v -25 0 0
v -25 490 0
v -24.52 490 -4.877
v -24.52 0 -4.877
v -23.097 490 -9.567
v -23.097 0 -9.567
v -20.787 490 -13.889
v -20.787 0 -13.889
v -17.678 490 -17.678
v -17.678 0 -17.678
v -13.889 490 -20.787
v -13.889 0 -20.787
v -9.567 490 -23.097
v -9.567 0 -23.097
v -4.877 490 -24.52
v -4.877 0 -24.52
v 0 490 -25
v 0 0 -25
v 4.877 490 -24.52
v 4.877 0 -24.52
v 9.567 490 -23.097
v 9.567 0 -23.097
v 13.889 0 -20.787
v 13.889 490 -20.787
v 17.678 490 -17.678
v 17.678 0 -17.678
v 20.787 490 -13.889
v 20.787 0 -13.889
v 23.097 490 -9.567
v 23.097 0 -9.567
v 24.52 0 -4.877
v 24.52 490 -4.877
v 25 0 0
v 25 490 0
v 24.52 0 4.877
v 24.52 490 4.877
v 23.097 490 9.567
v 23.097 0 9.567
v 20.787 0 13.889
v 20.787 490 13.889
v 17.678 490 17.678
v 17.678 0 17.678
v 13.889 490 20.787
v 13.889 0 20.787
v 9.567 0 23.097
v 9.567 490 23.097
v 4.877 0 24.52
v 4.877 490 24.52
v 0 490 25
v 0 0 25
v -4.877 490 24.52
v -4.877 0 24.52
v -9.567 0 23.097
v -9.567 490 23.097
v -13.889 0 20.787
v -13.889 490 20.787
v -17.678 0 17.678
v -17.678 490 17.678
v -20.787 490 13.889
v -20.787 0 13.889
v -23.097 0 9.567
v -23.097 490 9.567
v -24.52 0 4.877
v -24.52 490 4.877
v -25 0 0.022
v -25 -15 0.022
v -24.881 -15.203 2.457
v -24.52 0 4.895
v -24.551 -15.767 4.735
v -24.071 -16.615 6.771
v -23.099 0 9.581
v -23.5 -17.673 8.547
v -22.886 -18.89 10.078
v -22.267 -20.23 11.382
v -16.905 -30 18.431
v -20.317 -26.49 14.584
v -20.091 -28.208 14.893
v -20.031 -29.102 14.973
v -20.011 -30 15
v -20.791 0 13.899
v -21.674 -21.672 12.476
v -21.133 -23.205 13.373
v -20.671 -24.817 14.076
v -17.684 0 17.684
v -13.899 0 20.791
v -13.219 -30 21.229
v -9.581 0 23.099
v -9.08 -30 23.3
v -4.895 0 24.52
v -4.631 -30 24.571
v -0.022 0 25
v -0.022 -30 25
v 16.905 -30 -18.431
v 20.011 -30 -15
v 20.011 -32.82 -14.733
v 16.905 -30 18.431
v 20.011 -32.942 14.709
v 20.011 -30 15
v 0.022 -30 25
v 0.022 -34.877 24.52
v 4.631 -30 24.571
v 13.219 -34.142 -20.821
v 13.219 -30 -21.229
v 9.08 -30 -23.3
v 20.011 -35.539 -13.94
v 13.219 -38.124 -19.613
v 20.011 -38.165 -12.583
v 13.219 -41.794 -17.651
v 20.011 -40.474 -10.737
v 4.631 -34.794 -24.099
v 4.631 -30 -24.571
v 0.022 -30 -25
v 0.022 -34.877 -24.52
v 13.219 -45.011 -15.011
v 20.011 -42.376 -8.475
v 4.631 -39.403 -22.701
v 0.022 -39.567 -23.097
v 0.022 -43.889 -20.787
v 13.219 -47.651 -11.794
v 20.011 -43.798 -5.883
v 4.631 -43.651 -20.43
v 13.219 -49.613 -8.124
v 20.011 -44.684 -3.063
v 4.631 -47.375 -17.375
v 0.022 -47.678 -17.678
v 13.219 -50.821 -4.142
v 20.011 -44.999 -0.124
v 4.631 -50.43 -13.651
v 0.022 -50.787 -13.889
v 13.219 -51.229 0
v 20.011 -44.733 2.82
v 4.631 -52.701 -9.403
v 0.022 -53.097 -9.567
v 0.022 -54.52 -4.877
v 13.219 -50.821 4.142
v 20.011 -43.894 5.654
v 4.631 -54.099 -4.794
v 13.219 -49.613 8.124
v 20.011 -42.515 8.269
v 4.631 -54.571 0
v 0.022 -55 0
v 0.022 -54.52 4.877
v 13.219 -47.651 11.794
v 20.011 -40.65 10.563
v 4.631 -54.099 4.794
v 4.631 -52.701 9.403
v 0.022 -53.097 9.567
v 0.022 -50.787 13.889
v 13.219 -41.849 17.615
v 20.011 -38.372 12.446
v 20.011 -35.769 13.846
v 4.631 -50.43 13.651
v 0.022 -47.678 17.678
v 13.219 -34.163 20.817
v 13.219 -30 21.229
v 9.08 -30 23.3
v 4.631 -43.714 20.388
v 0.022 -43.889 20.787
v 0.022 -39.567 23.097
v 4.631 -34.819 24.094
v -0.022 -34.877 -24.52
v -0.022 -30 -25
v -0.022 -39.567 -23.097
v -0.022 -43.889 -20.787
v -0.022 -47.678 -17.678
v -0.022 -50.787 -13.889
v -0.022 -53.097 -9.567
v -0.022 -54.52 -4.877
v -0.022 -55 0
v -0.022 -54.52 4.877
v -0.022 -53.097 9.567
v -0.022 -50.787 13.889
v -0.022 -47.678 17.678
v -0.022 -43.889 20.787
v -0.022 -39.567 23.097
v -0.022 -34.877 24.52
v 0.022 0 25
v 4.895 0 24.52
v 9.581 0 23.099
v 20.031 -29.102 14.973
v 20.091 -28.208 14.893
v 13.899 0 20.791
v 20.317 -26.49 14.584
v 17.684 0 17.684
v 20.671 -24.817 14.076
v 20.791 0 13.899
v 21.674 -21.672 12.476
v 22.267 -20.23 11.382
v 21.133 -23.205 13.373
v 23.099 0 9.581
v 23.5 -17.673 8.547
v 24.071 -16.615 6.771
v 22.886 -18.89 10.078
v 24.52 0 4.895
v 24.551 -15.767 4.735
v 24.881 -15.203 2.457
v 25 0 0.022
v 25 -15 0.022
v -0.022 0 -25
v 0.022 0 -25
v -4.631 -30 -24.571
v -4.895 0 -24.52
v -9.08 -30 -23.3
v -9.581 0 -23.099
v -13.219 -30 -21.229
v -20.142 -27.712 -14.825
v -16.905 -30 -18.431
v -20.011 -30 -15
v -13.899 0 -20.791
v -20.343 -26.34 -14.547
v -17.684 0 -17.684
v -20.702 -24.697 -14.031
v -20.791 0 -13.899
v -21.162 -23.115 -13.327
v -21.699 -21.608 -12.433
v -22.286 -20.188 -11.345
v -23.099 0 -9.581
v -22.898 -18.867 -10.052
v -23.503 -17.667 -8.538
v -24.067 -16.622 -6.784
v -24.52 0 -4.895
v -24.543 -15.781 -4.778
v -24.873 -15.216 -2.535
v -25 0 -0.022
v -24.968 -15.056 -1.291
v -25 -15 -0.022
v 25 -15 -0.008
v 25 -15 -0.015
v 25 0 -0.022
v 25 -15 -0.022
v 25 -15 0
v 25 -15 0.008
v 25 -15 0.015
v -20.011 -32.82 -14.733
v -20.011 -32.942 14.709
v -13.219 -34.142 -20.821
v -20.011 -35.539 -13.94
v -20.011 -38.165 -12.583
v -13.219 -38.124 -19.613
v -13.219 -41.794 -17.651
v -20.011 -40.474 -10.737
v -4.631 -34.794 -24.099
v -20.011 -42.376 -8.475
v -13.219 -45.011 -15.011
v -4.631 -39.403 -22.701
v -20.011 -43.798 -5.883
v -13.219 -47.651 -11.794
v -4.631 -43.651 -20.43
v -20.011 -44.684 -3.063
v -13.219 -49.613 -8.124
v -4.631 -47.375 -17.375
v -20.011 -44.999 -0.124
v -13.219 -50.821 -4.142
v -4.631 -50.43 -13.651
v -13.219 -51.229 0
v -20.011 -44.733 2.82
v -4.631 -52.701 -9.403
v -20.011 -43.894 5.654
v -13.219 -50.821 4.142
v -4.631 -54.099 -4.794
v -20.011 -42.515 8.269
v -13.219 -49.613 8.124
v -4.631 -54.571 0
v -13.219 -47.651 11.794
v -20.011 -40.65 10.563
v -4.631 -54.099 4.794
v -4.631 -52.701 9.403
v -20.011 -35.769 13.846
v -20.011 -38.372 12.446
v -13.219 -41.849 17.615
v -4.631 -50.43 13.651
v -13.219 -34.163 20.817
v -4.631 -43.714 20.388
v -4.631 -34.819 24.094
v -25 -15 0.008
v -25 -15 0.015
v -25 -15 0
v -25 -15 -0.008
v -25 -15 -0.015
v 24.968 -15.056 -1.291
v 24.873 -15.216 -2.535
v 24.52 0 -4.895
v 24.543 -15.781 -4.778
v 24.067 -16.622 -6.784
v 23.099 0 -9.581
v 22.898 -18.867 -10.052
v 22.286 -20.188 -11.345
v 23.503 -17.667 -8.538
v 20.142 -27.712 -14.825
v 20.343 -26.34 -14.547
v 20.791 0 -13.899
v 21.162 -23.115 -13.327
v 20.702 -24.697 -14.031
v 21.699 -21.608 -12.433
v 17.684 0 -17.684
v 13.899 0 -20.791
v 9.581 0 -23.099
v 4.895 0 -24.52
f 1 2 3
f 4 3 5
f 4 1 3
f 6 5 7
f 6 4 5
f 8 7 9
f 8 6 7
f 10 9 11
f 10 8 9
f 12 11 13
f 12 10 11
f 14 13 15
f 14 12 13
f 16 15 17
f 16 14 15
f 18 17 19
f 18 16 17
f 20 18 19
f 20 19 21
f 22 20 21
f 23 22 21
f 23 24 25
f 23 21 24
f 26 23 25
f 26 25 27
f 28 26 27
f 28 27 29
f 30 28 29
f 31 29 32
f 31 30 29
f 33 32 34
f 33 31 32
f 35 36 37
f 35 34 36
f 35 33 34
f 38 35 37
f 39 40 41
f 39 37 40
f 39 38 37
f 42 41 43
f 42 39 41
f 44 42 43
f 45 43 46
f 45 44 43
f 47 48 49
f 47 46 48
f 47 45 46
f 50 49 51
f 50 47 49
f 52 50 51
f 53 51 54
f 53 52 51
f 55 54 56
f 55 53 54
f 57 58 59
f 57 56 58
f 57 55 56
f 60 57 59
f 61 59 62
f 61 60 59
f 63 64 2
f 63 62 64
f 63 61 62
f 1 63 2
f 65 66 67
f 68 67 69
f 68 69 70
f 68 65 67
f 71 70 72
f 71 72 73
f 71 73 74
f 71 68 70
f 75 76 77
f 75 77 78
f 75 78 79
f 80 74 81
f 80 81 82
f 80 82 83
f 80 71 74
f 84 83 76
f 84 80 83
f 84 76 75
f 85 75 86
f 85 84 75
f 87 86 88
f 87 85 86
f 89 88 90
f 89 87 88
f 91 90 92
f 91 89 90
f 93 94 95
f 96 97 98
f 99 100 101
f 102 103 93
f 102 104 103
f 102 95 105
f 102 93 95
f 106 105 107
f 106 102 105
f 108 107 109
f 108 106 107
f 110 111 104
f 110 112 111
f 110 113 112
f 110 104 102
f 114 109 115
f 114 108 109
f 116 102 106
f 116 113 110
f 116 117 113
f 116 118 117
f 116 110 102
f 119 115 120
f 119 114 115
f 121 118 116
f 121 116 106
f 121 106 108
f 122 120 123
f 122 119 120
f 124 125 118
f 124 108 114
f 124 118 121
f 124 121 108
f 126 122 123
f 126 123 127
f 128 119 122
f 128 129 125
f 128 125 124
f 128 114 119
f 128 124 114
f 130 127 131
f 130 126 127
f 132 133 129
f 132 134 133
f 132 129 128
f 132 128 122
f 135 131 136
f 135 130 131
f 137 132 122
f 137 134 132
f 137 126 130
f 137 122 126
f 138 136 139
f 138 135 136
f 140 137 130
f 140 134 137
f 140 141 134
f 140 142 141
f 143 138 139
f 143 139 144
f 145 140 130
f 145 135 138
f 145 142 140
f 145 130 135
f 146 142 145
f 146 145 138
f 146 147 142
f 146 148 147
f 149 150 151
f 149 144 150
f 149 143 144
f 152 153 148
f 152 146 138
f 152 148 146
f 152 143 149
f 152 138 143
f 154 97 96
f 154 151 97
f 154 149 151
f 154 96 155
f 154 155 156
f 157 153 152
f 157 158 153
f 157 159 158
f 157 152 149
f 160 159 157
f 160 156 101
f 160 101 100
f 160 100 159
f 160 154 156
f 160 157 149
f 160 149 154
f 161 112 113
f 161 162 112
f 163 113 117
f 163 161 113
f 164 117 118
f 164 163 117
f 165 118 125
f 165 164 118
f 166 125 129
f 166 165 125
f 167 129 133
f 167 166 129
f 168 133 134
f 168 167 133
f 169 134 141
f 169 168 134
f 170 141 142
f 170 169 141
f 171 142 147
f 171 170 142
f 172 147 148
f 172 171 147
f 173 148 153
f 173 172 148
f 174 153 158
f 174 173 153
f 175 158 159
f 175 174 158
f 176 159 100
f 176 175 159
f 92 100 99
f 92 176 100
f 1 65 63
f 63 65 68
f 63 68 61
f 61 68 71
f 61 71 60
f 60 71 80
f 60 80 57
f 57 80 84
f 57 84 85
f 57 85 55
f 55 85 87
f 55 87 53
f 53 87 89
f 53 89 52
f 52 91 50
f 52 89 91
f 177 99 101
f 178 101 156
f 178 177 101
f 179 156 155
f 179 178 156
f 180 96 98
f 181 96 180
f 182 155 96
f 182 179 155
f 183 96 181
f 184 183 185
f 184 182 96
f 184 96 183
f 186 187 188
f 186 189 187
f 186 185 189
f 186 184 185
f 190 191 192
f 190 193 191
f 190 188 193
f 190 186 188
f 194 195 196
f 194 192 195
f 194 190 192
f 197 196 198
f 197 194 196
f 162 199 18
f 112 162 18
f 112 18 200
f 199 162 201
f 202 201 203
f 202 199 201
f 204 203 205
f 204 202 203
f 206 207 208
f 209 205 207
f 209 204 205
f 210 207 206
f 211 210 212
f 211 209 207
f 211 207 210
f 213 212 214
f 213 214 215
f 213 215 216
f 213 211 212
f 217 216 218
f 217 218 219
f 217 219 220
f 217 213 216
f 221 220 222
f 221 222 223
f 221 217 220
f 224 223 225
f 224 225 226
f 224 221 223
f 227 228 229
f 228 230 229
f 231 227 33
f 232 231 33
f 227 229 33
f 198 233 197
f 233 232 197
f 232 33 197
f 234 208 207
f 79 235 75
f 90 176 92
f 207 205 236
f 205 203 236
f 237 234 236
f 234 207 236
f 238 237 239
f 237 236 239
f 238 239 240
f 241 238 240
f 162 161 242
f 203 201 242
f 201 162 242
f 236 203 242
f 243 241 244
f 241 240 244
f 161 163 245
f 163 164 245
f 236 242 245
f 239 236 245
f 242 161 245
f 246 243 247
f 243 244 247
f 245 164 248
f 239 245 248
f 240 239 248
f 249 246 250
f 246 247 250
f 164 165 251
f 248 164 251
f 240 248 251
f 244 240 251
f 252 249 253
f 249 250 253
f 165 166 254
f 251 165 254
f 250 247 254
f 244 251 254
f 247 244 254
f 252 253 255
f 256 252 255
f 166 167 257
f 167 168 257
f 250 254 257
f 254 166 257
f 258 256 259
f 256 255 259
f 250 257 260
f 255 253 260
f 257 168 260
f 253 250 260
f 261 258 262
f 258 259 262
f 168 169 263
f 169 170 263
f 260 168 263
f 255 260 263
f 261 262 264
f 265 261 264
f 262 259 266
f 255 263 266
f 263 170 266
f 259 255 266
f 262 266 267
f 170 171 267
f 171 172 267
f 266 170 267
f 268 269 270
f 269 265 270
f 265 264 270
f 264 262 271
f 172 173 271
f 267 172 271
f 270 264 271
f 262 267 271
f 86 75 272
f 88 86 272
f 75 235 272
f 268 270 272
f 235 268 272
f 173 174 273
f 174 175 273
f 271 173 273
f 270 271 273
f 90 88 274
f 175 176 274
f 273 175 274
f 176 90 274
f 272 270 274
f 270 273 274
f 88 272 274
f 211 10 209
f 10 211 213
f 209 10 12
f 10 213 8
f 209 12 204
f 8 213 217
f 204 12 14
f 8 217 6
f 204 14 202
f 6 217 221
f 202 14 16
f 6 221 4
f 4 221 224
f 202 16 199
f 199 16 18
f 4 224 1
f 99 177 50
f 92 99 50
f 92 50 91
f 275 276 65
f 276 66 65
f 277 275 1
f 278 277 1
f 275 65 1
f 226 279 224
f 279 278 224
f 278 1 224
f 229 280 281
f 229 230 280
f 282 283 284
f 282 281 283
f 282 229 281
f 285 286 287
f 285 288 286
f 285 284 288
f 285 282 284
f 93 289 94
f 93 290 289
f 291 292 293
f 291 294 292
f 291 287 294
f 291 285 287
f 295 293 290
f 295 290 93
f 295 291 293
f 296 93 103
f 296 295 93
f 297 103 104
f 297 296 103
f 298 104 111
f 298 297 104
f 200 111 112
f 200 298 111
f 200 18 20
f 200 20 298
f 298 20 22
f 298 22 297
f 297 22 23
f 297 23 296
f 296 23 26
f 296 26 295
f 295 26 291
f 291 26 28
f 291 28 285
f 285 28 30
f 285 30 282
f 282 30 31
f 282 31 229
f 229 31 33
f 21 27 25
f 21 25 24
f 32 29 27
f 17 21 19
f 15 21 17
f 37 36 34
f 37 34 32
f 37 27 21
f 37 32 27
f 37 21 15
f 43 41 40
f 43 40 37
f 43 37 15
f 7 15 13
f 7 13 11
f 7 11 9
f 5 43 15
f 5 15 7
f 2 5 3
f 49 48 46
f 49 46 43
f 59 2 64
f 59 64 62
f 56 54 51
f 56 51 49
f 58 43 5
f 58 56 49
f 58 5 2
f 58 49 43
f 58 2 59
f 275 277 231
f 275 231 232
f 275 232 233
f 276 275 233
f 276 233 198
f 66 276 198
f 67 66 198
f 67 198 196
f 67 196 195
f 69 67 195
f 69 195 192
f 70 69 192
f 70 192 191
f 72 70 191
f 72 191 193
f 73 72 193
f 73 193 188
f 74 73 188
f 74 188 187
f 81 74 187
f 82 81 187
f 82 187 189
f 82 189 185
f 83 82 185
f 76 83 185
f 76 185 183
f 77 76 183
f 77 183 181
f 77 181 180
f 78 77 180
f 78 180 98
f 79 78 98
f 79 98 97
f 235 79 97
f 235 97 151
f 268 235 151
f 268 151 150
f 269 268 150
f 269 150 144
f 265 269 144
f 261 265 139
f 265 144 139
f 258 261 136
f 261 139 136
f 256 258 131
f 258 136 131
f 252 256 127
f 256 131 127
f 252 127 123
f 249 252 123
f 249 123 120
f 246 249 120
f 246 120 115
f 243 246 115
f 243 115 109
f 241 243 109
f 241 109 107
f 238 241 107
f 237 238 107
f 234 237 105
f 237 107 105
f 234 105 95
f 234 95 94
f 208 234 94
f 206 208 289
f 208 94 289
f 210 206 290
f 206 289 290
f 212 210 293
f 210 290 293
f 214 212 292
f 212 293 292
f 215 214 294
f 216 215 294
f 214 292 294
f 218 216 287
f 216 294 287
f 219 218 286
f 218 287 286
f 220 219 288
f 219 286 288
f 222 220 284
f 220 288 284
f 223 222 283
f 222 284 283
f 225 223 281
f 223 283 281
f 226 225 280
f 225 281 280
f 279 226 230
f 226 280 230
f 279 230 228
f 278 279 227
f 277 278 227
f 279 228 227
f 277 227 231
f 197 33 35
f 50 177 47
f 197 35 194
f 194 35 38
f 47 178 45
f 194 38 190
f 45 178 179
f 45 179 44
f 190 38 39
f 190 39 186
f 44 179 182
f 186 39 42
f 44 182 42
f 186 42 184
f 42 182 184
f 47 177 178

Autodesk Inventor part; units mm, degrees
ref_plane "XZ Plane" through (0, 0, 0) normal (0, 1, 0) x (-1, 0, 0)
ref_plane "XY Plane" through (0, 0, 0) normal (0, 0, 1) x (1, 0, 0)
sketch "Sketch1" plane through (0, 0, 0) normal (0, 1, 0) x (-1, 0, 0)
  circle A0 centre (0, 0) radius 25
  dimension "d0" = 50
extrude "Extrusion1" add sketch "Sketch1" along normal blind 490
sketch "Sketch2" plane through (0, 0, 0) normal (0, -1, 0) x (1, 0, 0)
  line L0 (-25, -25) -> (25, -25)
  line L1 (25, -25) -> (25, 25)
  line L2 (25, 25) -> (-25, 25)
  line L3 (-25, 25) -> (-25, -25)
  point P0 (0, 0)
extrude "Extrusion2" add sketch "Sketch2" along normal blind 60
sketch "Sketch3" plane through (0, 0, 0) normal (1, 0, 0) x (0, 1, 0)
  circle A0 centre (-30, 0) radius 15
  line L0 (0, -25) -> (0, 0) projected
  line L1 (0, 25) -> (-60, 25) projected
  line L2 (0, -25) -> (-60, -25) projected
  arc A1 (-30, 25) -> (-30, -25) centre (-30, 0) ccw
  line L3 (-30, 25) -> (-30, 40.1158)
  line L4 (-30, 40.1158) -> (-76.6193, 40.1158)
  line L5 (-76.6193, 40.1158) -> (-77.4473, -45.6375)
  line L6 (-77.4473, -45.6375) -> (-35.1048, -45.6375)
  line L7 (-35.1048, -45.6375) -> (-30, -25)
  dimension "d5" = 30
  dimension "d6" = 30
extrude "Extrusion3" cut sketch "Sketch3" along normal mid plane 100
fillet "Fillet1" radius 24.9775 6 edges at (25, -55, 0) (25, -15, -25) (25, -15, 25) (-25, -55, 0) (-25, -15, -25) (-25, -15, 25)
sketch "Sketch4" plane through (0, 0, 0) normal (1, 0, 0) x (0, 1, 0)
  line L0 (16.2777, 47.2828) -> (16.2777, -82.9386)
  point P0 (0, 0)
properties part number "Piston_Bom"
